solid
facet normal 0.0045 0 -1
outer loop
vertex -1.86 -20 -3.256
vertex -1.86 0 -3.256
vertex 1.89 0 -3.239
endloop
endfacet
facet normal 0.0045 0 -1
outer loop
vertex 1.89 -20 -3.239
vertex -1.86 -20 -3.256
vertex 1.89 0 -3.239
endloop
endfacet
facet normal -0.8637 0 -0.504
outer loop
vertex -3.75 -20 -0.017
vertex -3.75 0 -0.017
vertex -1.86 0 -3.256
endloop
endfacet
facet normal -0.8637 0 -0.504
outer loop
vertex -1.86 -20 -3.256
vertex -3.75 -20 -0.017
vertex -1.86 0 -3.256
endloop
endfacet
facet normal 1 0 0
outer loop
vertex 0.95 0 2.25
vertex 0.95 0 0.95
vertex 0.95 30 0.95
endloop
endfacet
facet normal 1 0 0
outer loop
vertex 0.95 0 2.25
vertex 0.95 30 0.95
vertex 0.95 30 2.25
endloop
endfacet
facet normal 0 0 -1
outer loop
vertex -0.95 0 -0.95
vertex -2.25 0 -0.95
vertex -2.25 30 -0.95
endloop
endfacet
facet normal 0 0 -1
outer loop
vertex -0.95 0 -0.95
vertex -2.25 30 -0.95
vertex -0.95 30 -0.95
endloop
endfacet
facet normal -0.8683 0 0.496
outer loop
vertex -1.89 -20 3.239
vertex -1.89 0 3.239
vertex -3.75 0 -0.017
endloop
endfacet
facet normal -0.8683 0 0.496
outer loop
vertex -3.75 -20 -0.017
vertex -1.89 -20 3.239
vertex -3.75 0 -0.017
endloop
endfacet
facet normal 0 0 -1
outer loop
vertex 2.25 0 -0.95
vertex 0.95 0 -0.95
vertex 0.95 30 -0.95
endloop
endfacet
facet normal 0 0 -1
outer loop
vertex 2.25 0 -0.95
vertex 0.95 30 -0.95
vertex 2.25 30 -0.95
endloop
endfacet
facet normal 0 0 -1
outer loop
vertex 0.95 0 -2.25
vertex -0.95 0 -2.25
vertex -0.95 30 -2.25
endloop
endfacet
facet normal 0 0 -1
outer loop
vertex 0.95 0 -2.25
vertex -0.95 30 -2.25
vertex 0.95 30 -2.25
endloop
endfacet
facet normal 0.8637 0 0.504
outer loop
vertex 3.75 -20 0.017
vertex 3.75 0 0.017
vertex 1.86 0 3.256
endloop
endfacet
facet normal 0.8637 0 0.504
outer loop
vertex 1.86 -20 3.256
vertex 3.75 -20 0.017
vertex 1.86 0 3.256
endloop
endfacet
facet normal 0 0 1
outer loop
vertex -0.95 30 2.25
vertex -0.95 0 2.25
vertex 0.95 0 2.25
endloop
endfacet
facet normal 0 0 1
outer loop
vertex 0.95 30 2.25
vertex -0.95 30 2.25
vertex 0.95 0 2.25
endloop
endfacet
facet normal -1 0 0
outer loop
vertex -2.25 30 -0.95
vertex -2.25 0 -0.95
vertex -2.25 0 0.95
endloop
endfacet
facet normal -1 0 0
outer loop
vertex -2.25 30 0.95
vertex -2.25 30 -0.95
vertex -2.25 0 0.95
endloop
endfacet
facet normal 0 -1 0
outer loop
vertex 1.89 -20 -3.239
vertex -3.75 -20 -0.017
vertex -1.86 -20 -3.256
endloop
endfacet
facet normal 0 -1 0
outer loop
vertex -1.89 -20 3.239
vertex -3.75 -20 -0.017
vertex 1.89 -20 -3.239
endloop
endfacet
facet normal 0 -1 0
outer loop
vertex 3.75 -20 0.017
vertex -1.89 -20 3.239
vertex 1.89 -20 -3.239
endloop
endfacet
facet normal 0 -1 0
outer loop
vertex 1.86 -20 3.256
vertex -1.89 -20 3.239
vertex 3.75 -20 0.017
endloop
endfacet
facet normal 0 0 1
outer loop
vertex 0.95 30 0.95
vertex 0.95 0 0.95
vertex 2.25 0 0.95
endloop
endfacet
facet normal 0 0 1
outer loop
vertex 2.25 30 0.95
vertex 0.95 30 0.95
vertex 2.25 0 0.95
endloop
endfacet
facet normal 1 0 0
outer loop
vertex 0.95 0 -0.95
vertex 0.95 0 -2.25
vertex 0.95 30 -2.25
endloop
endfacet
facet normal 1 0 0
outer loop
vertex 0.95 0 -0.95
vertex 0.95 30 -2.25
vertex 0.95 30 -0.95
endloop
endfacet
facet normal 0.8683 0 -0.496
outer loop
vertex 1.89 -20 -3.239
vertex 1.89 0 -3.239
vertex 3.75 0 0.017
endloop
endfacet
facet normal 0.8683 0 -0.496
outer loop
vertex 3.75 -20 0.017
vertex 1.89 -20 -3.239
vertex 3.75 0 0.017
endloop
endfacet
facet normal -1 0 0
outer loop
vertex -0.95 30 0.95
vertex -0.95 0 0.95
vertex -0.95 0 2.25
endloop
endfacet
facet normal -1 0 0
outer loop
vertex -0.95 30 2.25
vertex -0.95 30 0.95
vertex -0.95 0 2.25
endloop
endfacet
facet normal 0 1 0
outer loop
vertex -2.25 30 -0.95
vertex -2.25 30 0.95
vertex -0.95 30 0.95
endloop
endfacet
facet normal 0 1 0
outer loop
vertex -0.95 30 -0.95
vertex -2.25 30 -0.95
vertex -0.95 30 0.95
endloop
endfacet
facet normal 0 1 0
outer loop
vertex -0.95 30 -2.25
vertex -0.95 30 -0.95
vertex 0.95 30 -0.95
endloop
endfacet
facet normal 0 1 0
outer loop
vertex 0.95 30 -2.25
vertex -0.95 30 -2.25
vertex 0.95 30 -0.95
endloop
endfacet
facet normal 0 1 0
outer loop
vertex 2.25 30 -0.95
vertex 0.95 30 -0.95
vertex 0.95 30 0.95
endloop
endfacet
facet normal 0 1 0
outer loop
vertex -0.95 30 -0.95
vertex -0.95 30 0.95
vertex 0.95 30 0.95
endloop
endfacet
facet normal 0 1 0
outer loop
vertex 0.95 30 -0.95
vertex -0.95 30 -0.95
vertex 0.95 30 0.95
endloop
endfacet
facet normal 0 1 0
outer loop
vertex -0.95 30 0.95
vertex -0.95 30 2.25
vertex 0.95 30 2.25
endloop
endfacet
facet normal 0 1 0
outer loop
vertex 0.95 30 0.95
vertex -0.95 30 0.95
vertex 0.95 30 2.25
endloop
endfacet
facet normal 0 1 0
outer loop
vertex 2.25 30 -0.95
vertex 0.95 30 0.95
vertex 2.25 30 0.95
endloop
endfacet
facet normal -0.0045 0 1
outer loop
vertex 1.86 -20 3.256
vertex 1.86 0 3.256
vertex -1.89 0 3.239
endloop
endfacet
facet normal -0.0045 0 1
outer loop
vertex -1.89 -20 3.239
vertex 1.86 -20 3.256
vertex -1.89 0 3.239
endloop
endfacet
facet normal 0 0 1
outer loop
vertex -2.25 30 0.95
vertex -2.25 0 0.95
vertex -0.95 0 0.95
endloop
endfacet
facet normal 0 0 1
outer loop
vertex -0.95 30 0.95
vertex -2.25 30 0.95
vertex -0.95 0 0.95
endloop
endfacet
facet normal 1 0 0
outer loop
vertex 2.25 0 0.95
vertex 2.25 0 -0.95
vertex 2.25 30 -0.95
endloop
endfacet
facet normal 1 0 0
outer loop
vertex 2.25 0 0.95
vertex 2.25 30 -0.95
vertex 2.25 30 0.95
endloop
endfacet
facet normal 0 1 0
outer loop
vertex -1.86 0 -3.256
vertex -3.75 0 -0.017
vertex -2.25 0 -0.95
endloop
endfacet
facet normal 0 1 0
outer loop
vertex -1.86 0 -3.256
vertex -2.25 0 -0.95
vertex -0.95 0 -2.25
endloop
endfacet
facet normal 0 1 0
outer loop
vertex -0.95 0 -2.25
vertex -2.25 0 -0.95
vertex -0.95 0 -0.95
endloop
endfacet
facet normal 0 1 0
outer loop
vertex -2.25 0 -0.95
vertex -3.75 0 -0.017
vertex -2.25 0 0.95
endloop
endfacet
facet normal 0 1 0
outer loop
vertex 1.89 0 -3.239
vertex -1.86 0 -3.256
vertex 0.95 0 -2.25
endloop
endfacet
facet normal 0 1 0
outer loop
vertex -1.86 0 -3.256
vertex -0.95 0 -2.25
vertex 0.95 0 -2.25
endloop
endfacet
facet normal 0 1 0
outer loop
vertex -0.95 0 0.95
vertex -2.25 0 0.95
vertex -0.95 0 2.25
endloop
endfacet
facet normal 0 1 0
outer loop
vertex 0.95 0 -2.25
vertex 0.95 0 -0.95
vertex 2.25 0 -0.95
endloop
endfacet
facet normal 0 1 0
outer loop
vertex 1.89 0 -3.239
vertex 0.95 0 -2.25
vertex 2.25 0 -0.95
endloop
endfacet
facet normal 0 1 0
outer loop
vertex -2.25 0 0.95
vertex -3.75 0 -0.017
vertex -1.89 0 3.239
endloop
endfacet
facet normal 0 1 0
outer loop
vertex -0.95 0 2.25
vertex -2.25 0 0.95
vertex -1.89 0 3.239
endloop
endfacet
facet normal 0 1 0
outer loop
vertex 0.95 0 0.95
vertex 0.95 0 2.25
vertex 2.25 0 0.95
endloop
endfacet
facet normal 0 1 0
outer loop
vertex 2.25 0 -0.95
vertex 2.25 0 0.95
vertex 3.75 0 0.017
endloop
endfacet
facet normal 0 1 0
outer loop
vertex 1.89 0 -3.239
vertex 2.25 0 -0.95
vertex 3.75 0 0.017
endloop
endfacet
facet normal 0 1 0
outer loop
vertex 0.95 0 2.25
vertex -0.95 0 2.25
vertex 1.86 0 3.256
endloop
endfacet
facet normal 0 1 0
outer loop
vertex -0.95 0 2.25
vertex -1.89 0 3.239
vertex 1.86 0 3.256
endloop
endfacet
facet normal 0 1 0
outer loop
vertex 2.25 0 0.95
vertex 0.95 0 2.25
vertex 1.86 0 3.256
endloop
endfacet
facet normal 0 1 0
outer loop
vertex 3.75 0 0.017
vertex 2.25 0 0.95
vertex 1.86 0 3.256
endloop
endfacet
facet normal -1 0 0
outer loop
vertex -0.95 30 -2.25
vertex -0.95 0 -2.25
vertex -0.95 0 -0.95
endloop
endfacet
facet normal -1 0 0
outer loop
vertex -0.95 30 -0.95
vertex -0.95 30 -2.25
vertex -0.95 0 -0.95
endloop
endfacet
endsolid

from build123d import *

# Parameters (mm, degrees)
F1_DEPTH = 20
F2_W     = 1.9
F2_H     = 1.3
F2_W_2   = 1.3
F2_H_2   = 1.9
F3_DEPTH = 30


with BuildPart() as f1:
    # F0 (on Front) → F1 (new body)
    with BuildSketch(Plane.XZ):
        Polygon((3.75, 0.0170362348), (1.8602461879, 3.2561133816), (-1.8897538121, 3.2390771468), (-3.75, -0.0170362348), (-1.8602461879, -3.2561133816), (1.8897538121, -3.2390771468), align=None)
    extrude(amount=F1_DEPTH)

    # F2 (on Front) → F3 (join)
    with BuildSketch(Plane.XZ):
        with Locations((0, 1.6)):
            Rectangle(F2_W, F2_H)
        with Locations((-1.6, 0)):
            Rectangle(F2_W_2, F2_H_2)
        Rectangle(F2_W, F2_H_2)
        with Locations((1.6, 0)):
            Rectangle(F2_W_2, F2_H_2)
        with Locations((0, -1.6)):
            Rectangle(F2_W, F2_H)
    extrude(amount=-F3_DEPTH)


solid = f1.part
